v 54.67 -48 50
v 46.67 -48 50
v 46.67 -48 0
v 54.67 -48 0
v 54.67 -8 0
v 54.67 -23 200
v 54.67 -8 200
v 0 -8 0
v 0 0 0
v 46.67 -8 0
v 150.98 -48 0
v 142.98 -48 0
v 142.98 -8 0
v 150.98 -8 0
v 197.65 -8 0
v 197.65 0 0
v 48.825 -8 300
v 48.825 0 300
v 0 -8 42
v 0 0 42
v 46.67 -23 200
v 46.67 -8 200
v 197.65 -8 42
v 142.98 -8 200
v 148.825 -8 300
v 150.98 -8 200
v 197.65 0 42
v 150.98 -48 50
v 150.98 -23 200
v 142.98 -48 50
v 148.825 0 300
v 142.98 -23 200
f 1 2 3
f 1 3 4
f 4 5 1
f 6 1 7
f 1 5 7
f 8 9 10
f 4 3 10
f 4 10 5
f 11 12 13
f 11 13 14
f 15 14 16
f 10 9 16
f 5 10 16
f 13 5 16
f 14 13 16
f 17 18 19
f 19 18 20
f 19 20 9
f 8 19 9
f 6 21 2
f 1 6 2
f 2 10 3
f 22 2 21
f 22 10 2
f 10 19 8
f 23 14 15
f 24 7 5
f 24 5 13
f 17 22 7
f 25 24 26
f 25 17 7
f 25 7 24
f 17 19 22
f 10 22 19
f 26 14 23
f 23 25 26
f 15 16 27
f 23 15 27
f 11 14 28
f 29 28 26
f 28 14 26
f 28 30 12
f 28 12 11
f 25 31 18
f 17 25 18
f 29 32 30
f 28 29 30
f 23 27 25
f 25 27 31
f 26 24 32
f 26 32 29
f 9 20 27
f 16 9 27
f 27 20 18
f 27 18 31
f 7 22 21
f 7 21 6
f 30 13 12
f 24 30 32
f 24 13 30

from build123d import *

# Parameters (mm, degrees)
F1_DEPTH = 8
F2_W     = 8
F2_H     = 200
F3_DEPTH = 40
F5_DEPTH = 150


with BuildPart() as f1:
    # F0 (on Front) → F1 (new body)
    with BuildSketch(Plane.XZ):
        Polygon((0, 42), (0, 0), (98.825, 0), (98.825, 300), (48.825, 300), align=None)
        Polygon((98.825, 300), (98.825, 0), (197.65, 0), (197.65, 42), (148.825, 300), align=None)
    extrude(amount=F1_DEPTH)

    # F2 (on face) → F3 (join)
    with BuildSketch(Plane.XZ.offset(8)):
        with Locations((50.67, 100)):
            Rectangle(F2_W, F2_H)
        with Locations((146.98, 100)):
            Rectangle(F2_W, F2_H)
    extrude(amount=F3_DEPTH)

    # F4 (on face) → F5 (cut)
    with BuildSketch(Plane(origin=(46.67, 0, 0), x_dir=(0, -1, 0), z_dir=(-1, 0, 0))):
        Polygon((23, 200), (48, 50), (48, 200), align=None)
    extrude(amount=-F5_DEPTH, mode=Mode.SUBTRACT)


solid = f1.part
